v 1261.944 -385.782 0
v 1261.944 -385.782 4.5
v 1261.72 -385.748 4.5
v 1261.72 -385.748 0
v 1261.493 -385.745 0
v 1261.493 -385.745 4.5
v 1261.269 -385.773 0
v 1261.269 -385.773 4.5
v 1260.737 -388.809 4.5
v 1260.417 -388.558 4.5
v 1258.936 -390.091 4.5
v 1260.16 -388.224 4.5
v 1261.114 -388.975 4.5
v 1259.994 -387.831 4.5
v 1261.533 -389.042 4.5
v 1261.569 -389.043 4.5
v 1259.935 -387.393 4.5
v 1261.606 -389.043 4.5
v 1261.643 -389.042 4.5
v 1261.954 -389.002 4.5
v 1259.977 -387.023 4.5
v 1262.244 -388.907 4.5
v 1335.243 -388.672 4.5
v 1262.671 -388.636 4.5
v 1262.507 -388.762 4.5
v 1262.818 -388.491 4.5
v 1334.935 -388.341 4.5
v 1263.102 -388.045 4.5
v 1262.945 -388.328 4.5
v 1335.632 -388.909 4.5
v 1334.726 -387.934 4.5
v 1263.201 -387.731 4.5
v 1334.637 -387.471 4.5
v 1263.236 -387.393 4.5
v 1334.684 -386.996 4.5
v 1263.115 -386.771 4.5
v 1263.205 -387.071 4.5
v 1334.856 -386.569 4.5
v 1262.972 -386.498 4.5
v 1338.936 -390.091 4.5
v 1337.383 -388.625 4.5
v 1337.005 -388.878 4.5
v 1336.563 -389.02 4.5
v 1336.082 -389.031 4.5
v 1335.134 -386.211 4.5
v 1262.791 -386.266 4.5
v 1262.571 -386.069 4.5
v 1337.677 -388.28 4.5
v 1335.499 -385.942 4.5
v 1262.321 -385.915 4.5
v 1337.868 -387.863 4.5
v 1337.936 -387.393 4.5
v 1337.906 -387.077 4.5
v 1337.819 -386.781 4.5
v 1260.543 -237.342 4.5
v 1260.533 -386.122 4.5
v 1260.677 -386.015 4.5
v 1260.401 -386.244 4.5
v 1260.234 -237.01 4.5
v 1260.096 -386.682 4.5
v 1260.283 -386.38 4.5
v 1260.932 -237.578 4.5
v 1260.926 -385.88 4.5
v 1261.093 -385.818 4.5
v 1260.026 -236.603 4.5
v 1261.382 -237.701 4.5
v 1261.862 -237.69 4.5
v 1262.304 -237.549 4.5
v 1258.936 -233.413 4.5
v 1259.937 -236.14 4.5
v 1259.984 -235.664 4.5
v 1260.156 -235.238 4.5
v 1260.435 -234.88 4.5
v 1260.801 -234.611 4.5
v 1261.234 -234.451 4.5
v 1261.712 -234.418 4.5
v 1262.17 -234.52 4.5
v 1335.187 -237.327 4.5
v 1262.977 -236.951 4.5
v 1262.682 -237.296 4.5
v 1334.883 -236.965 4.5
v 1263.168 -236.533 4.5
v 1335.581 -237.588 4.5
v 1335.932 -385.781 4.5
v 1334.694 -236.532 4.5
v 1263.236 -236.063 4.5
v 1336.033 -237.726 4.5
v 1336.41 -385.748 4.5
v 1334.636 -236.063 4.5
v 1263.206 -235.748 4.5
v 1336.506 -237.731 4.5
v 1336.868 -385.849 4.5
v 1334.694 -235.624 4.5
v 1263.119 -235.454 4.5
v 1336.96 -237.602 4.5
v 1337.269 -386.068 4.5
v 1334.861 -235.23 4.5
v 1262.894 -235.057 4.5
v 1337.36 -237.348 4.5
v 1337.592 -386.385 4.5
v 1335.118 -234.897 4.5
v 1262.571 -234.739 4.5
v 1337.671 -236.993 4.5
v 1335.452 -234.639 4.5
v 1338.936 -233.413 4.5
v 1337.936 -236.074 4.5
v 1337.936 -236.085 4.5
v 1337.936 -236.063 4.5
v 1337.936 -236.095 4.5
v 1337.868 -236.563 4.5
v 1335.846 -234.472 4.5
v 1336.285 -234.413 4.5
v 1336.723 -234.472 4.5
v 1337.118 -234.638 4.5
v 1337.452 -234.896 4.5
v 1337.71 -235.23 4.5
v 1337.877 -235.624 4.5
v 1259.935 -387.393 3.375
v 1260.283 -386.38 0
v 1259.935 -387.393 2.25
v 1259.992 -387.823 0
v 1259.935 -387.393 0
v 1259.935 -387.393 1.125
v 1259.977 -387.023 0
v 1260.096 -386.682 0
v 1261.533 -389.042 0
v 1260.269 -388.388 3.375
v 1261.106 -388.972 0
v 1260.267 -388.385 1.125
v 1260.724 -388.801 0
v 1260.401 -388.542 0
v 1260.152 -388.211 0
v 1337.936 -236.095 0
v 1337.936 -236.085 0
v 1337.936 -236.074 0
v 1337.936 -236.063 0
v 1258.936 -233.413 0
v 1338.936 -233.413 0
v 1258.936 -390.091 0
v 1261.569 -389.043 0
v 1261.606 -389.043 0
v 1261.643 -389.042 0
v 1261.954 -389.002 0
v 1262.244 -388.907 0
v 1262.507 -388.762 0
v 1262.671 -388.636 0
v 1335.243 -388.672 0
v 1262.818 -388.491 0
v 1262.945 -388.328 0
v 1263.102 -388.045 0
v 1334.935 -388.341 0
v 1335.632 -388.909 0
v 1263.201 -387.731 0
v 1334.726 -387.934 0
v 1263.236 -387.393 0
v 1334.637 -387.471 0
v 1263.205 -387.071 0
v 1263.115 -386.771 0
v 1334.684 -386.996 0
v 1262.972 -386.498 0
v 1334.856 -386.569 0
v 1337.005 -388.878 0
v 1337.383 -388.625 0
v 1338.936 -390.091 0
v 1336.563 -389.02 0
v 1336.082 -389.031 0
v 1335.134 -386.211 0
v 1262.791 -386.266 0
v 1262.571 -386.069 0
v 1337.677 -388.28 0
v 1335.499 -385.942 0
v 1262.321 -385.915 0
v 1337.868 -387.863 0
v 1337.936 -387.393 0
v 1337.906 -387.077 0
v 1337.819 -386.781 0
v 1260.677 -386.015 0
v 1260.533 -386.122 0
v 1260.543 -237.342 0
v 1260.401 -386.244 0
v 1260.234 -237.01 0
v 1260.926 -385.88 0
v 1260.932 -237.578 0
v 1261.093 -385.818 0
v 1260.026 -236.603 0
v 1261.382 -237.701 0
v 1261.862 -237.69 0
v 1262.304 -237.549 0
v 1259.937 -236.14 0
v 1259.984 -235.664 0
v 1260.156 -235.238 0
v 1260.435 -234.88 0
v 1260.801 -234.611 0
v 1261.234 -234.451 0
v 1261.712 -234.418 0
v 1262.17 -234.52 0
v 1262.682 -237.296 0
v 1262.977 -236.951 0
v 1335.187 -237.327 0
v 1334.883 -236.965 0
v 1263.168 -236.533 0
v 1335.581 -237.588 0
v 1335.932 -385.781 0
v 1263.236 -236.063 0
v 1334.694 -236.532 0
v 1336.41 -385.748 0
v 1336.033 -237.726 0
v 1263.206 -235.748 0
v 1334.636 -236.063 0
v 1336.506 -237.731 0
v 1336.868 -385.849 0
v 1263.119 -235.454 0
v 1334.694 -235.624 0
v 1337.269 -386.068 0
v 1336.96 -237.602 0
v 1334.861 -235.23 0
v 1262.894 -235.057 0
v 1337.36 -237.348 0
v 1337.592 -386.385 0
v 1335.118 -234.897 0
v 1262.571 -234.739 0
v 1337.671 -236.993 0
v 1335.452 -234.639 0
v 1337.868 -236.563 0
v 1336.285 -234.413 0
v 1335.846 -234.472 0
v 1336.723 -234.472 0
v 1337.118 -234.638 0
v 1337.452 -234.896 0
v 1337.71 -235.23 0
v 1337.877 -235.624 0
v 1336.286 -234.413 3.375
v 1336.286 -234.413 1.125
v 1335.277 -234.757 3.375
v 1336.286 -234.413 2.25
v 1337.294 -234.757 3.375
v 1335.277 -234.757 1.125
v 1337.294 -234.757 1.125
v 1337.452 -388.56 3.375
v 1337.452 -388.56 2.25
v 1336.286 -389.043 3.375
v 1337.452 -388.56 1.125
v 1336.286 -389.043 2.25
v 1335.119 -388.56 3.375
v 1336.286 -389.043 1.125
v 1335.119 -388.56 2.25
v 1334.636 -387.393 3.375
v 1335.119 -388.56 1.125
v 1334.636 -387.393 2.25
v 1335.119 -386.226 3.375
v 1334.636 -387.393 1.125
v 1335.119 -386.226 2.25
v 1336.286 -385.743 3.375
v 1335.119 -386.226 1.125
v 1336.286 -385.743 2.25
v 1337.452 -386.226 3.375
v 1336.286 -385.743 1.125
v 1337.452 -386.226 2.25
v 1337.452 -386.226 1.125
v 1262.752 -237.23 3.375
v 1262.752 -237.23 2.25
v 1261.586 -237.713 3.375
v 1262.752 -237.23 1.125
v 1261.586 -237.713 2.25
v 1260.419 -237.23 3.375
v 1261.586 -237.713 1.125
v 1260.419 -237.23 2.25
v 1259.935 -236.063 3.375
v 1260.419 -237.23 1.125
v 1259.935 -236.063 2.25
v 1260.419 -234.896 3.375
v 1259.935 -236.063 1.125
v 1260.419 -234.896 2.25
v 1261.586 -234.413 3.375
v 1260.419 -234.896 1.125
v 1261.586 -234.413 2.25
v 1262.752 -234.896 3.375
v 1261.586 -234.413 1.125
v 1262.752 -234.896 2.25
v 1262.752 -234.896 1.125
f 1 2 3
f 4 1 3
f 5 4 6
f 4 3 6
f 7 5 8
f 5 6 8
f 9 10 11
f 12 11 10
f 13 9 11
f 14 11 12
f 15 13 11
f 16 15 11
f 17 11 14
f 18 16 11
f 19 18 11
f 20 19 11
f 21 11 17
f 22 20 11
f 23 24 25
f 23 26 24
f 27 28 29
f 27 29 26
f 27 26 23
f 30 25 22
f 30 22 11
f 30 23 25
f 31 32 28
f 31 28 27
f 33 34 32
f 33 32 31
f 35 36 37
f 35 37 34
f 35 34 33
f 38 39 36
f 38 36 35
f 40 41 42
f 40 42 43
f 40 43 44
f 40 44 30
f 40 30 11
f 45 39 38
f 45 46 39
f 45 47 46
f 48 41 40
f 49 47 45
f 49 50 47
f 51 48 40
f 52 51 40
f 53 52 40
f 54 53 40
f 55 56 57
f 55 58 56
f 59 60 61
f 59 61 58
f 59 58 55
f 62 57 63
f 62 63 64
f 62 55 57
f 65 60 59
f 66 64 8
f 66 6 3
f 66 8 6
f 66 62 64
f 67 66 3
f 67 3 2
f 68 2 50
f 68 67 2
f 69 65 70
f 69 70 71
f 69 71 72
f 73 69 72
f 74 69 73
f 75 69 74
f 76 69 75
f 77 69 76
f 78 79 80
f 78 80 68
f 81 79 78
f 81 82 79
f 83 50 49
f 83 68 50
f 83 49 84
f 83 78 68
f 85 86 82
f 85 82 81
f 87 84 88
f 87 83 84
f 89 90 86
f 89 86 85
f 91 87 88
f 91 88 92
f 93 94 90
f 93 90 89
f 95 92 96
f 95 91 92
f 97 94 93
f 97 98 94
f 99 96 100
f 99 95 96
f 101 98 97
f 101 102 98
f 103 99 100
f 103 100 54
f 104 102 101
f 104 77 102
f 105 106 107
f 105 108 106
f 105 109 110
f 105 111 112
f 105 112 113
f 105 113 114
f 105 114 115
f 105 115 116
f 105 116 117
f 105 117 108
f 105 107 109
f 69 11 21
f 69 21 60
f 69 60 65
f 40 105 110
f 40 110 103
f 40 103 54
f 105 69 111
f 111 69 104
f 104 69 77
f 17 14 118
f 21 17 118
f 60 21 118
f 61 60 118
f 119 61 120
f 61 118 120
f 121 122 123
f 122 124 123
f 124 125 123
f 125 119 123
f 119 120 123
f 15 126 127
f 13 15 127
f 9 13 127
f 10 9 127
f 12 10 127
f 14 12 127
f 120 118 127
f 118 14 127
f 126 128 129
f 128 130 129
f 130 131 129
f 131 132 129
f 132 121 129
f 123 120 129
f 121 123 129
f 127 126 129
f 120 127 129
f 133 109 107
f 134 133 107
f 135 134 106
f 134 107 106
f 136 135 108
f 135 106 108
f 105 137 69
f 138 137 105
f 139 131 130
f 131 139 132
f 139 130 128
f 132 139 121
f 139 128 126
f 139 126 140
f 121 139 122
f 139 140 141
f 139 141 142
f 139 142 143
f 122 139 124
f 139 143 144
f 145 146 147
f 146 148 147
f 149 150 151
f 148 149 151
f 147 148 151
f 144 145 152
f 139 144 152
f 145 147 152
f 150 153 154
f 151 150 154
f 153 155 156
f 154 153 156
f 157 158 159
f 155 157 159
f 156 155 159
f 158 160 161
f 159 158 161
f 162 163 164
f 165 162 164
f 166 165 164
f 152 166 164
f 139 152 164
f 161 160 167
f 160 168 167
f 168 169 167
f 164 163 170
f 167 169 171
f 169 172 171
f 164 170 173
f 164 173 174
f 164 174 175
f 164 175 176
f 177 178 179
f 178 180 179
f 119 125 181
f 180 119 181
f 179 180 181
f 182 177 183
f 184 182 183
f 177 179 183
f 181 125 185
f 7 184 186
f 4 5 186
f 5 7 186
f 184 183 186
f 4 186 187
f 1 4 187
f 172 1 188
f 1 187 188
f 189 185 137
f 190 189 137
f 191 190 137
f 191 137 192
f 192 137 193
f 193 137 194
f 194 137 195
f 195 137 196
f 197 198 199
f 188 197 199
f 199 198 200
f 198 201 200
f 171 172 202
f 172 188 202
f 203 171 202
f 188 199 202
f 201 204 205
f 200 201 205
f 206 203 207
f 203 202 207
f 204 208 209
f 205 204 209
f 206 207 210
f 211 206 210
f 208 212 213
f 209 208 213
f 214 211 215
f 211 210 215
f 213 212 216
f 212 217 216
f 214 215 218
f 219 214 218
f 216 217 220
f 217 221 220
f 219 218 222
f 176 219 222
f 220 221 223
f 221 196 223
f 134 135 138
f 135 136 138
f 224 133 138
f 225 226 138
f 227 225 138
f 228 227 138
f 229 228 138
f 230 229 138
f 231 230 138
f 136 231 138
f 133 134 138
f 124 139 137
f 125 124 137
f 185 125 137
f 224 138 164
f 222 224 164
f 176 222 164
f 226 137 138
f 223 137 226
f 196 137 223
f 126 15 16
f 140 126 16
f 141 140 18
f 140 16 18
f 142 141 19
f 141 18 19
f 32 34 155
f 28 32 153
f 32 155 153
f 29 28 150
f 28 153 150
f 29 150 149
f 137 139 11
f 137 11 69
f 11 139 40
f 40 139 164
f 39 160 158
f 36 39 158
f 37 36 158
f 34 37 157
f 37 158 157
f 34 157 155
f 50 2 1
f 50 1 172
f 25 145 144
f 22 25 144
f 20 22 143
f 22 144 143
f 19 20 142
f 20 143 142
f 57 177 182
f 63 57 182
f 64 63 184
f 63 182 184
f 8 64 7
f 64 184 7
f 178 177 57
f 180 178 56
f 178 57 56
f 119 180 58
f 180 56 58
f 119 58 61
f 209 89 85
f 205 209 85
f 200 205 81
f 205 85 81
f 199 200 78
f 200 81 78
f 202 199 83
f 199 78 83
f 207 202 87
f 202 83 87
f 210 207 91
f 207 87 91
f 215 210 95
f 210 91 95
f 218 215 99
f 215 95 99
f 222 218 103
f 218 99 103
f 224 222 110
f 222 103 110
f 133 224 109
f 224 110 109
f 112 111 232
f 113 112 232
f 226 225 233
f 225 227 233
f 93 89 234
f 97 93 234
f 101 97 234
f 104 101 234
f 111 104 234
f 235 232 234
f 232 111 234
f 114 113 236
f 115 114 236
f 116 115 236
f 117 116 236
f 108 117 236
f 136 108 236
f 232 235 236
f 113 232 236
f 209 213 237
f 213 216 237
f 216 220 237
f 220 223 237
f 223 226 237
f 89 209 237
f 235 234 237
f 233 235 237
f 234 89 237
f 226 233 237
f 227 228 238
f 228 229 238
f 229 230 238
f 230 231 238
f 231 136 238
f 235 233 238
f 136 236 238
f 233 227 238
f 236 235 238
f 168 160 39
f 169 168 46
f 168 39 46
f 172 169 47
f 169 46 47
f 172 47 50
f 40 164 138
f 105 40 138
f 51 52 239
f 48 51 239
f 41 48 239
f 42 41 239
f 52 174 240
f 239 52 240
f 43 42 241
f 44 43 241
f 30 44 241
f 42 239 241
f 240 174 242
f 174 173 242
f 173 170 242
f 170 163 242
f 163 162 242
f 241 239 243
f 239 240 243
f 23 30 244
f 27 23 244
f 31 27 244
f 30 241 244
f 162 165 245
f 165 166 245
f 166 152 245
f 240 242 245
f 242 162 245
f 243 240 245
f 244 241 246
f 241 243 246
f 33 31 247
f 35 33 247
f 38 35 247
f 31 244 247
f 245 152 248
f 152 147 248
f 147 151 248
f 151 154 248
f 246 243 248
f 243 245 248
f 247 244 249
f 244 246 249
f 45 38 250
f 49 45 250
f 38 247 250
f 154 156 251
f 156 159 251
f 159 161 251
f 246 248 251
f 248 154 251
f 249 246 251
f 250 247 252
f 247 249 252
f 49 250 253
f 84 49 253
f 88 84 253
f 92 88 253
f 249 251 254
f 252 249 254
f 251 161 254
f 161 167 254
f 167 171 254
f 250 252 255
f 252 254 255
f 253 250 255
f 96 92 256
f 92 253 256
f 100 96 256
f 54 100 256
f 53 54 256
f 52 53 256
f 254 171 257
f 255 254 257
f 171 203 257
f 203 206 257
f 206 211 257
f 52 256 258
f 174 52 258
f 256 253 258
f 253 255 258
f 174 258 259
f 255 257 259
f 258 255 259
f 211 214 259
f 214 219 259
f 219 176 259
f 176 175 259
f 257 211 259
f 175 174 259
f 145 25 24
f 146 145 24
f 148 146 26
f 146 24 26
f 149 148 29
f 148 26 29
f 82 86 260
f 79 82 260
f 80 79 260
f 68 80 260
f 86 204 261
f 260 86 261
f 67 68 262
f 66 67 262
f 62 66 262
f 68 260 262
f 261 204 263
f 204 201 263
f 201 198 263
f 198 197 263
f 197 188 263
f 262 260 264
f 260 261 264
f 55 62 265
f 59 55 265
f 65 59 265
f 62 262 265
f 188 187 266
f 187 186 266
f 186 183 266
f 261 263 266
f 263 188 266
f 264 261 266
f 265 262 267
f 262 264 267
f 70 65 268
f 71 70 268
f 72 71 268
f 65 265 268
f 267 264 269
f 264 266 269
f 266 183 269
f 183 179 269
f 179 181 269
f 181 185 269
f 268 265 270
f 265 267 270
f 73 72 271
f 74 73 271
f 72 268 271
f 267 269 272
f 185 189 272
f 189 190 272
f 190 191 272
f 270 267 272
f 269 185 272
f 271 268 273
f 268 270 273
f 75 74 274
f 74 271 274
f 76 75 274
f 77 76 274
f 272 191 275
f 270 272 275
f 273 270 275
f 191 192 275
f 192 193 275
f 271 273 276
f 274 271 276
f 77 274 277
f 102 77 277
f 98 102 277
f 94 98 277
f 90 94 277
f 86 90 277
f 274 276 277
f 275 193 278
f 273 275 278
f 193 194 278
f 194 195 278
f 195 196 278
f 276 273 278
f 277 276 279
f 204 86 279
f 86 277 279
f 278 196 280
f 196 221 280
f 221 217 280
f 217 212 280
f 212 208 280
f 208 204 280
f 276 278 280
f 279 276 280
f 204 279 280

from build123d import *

# Parameters (mm, degrees)
MODEL_W             = 79.999946
MODEL_H             = 156.677783
BOSS_EXTRUDE1_DEPTH = 4.5
SKETCH2_R           = 1.650333
SKETCH2_R_2         = 1.650206
CUT_EXTRUDE1_DEPTH  = 10


with BuildPart() as part:
    # Model → Boss-Extrude1 (new body)
    with BuildSketch(Plane.XY):
        with Locations((1298.935696, -311.751866)):
            Rectangle(MODEL_W, MODEL_H)
        with BuildLine():
            add(Edge.make_bspline(
                [(1334.63552, -236.062935), (1334.63552, -235.15171), (1335.374131, -234.413063), (1336.285708, -234.413063), (1337.196581, -234.413063), (1337.935544, -235.15171), (1337.935544, -236.062935)],
                knots=[2, 2, 2, 2, 3, 3, 3, 4, 4, 4, 4], degree=3))
            add(Edge.make_bspline(
                [(1337.935544, -236.062935), (1337.935544, -236.97416), (1337.196581, -237.713123), (1336.285708, -237.713123), (1335.374131, -237.713123), (1334.63552, -236.97416), (1334.63552, -236.062935)],
                knots=[0, 0, 0, 0, 1, 1, 1, 2, 2, 2, 2], degree=3))
        make_face(mode=Mode.SUBTRACT)
        with BuildLine():
            add(Edge.make_bspline(
                [(1259.935496, -236.062935), (1259.935496, -235.15171), (1260.674142, -234.413063), (1261.585684, -234.413063), (1262.496592, -234.413063), (1263.235555, -235.15171), (1263.235555, -236.062935)],
                knots=[2, 2, 2, 2, 3, 3, 3, 4, 4, 4, 4], degree=3))
            add(Edge.make_bspline(
                [(1263.235555, -236.062935), (1263.235555, -236.97416), (1262.496592, -237.713123), (1261.585684, -237.713123), (1260.674142, -237.713123), (1259.935496, -236.97416), (1259.935496, -236.062935)],
                knots=[0, 0, 0, 0, 1, 1, 1, 2, 2, 2, 2], degree=3))
        make_face(mode=Mode.SUBTRACT)
        with BuildLine():
            add(Edge.make_bspline(
                [(1259.935496, -387.392889), (1259.935496, -386.481664), (1260.674142, -385.743018), (1261.585684, -385.743018), (1262.496592, -385.743018), (1263.235908, -386.481664), (1263.235908, -387.392889)],
                knots=[2, 2, 2, 2, 3, 3, 3, 4, 4, 4, 4], degree=3))
            add(Edge.make_bspline(
                [(1263.235908, -387.392889), (1263.235908, -388.304114), (1262.496592, -389.043078), (1261.585684, -389.043078), (1260.674142, -389.043078), (1259.935496, -388.304114), (1259.935496, -387.392889)],
                knots=[0, 0, 0, 0, 1, 1, 1, 2, 2, 2, 2], degree=3))
        make_face(mode=Mode.SUBTRACT)
        with BuildLine():
            add(Edge.make_bspline(
                [(1334.63552, -387.392889), (1334.63552, -386.481664), (1335.374131, -385.743018), (1336.285708, -385.743018), (1337.196581, -385.743018), (1337.935897, -386.481664), (1337.935897, -387.392889)],
                knots=[2, 2, 2, 2, 3, 3, 3, 4, 4, 4, 4], degree=3))
            add(Edge.make_bspline(
                [(1337.935897, -387.392889), (1337.935897, -388.304114), (1337.196581, -389.043078), (1336.285708, -389.043078), (1335.374131, -389.043078), (1334.63552, -388.304114), (1334.63552, -387.392889)],
                knots=[0, 0, 0, 0, 1, 1, 1, 2, 2, 2, 2], degree=3))
        make_face(mode=Mode.SUBTRACT)
    extrude(amount=BOSS_EXTRUDE1_DEPTH)

    # Sketch2 → Cut-Extrude1 (cut)
    with BuildSketch(Plane.XY.offset(4.5)):
        with Locations((1336.285532, -236.095454)):
            Circle(SKETCH2_R)
        with Locations((1261.585702, -387.392889)):
            Circle(SKETCH2_R_2)
    extrude(amount=-CUT_EXTRUDE1_DEPTH, mode=Mode.SUBTRACT)


solid = part.part
